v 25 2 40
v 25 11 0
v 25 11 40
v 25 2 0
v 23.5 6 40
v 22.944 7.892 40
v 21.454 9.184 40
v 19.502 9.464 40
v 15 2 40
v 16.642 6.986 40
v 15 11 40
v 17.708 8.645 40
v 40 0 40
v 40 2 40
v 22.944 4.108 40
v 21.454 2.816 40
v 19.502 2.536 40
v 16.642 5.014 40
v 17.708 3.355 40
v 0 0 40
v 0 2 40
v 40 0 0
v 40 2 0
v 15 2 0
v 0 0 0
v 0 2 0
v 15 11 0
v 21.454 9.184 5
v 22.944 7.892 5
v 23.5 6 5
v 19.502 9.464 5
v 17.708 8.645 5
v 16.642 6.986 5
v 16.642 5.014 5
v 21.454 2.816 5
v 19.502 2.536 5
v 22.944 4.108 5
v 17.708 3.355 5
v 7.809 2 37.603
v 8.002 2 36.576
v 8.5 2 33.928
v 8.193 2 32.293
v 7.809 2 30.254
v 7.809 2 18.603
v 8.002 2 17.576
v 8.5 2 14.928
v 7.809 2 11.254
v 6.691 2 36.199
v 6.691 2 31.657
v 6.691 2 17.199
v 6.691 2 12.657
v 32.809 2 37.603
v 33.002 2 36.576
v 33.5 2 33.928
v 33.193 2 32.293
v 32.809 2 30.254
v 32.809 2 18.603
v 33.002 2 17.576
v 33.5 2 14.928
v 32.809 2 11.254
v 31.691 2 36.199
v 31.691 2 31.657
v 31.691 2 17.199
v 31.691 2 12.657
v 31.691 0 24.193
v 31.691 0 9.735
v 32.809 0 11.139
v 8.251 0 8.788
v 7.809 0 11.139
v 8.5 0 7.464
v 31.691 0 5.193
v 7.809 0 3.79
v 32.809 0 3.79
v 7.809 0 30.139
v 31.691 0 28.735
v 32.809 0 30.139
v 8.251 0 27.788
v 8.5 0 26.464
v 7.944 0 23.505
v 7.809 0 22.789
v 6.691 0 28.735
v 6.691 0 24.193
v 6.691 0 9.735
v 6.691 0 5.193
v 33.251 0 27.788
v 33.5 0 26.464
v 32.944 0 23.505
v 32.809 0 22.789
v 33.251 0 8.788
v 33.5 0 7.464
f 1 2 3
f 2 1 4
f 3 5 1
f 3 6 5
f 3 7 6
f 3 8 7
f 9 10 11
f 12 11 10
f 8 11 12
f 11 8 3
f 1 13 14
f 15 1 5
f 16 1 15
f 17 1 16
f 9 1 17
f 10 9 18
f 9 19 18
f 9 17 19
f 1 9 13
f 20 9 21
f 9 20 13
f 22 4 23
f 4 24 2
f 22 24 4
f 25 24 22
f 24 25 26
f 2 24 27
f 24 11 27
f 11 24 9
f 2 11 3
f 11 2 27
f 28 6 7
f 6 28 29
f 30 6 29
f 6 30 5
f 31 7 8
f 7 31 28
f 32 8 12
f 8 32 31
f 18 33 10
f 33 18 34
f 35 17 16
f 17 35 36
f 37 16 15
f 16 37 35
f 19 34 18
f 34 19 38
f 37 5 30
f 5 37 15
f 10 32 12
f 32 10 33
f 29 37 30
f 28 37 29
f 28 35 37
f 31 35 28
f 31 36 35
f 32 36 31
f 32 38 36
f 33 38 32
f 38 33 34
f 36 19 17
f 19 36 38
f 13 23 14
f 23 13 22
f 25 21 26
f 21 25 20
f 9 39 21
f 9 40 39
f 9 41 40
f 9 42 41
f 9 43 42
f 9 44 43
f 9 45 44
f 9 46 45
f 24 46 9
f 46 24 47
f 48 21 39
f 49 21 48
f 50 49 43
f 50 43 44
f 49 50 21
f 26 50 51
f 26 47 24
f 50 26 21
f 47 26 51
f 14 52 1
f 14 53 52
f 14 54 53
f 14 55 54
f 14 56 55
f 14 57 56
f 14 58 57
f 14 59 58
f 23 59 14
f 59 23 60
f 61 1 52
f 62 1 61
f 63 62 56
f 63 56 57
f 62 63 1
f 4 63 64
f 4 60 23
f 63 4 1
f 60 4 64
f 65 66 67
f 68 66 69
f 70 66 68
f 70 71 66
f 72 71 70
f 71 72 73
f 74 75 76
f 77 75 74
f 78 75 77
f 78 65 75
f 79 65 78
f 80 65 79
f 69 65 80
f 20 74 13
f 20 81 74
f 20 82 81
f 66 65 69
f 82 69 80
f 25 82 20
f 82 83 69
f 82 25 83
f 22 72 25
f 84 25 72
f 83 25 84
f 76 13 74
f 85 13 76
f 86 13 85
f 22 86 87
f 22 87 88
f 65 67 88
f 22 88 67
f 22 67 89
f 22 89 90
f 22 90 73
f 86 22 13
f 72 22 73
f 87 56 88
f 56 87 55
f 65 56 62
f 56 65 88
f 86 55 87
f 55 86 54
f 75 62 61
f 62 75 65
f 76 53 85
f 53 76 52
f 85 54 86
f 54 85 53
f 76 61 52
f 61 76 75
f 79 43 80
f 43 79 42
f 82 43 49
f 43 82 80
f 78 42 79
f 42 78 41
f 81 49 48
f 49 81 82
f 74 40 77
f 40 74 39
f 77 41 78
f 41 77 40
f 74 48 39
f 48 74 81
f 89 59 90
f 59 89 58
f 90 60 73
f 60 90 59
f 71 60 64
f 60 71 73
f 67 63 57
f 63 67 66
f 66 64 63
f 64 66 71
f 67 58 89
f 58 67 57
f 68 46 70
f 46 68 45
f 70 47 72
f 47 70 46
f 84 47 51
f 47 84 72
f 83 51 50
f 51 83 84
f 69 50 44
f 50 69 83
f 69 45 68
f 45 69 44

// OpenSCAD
difference()
{
	translate([15,1,0]) cube([10,10,40]);
	translate([20,6,5]) cylinder(h=36,d=7);
}
difference()
{
	cube([40,2,40]);
	translate([32.5,-2,19]) rotate([-15,0,0]) cylinder(h=25,d=2);
	translate([7.5,-2,19]) rotate([-15,0,0]) cylinder(h=25,d=2);
	translate([32.5,-2,0]) rotate([-15,0,0]) cylinder(h=25,d=2);
	translate([7.5,-2,0]) rotate([-15,0,0]) cylinder(h=25,d=2);
}
